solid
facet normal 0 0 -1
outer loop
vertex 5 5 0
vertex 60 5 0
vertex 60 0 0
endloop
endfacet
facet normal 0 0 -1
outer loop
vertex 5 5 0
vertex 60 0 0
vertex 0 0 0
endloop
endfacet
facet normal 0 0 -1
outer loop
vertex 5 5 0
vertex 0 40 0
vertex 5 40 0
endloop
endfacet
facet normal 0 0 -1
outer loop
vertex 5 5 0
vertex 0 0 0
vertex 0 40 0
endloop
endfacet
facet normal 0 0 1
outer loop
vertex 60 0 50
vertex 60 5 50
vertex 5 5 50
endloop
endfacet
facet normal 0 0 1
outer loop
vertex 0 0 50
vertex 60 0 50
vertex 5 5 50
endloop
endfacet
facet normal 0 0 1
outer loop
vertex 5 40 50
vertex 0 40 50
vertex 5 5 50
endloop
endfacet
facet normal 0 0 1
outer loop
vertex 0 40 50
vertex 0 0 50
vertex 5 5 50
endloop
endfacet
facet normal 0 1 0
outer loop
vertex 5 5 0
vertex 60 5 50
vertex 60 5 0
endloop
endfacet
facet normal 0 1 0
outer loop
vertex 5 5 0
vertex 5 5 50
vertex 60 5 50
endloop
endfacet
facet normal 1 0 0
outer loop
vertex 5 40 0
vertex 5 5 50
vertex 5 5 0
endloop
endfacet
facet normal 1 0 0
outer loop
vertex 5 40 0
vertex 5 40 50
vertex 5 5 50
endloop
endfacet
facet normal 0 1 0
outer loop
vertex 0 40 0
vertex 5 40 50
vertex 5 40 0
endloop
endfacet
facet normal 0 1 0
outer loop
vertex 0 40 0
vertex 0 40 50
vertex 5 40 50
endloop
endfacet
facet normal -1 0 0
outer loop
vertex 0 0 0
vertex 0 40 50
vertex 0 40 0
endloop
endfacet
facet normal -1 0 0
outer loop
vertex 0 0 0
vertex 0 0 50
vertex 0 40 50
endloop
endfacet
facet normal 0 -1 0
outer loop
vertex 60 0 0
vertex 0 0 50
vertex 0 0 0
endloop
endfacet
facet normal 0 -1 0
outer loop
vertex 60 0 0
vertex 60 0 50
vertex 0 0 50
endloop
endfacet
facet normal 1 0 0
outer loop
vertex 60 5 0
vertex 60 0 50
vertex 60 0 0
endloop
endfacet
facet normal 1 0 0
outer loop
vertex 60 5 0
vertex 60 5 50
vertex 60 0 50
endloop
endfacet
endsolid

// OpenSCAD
$fn = 32;

// ----------------------------------------------------------------------
// Structural section: angle 60 x 40 mm
// ----------------------------------------------------------------------

// --- parameters (mm) ---
sec_w = 60;               // leg width, X
sec_h = 40;               // leg height, Y
flange_t = 5;             // leg thickness
plate_t = 50;             // cut length, Z (extrusion height)

profile = [[0, 0], [60, 0], [60, 5], [5, 5], [5, 40], [0, 40]];  // primary outline, 6 points, counter clockwise

// --- the one profile operation ---
linear_extrude(height = plate_t) polygon(points = profile);
